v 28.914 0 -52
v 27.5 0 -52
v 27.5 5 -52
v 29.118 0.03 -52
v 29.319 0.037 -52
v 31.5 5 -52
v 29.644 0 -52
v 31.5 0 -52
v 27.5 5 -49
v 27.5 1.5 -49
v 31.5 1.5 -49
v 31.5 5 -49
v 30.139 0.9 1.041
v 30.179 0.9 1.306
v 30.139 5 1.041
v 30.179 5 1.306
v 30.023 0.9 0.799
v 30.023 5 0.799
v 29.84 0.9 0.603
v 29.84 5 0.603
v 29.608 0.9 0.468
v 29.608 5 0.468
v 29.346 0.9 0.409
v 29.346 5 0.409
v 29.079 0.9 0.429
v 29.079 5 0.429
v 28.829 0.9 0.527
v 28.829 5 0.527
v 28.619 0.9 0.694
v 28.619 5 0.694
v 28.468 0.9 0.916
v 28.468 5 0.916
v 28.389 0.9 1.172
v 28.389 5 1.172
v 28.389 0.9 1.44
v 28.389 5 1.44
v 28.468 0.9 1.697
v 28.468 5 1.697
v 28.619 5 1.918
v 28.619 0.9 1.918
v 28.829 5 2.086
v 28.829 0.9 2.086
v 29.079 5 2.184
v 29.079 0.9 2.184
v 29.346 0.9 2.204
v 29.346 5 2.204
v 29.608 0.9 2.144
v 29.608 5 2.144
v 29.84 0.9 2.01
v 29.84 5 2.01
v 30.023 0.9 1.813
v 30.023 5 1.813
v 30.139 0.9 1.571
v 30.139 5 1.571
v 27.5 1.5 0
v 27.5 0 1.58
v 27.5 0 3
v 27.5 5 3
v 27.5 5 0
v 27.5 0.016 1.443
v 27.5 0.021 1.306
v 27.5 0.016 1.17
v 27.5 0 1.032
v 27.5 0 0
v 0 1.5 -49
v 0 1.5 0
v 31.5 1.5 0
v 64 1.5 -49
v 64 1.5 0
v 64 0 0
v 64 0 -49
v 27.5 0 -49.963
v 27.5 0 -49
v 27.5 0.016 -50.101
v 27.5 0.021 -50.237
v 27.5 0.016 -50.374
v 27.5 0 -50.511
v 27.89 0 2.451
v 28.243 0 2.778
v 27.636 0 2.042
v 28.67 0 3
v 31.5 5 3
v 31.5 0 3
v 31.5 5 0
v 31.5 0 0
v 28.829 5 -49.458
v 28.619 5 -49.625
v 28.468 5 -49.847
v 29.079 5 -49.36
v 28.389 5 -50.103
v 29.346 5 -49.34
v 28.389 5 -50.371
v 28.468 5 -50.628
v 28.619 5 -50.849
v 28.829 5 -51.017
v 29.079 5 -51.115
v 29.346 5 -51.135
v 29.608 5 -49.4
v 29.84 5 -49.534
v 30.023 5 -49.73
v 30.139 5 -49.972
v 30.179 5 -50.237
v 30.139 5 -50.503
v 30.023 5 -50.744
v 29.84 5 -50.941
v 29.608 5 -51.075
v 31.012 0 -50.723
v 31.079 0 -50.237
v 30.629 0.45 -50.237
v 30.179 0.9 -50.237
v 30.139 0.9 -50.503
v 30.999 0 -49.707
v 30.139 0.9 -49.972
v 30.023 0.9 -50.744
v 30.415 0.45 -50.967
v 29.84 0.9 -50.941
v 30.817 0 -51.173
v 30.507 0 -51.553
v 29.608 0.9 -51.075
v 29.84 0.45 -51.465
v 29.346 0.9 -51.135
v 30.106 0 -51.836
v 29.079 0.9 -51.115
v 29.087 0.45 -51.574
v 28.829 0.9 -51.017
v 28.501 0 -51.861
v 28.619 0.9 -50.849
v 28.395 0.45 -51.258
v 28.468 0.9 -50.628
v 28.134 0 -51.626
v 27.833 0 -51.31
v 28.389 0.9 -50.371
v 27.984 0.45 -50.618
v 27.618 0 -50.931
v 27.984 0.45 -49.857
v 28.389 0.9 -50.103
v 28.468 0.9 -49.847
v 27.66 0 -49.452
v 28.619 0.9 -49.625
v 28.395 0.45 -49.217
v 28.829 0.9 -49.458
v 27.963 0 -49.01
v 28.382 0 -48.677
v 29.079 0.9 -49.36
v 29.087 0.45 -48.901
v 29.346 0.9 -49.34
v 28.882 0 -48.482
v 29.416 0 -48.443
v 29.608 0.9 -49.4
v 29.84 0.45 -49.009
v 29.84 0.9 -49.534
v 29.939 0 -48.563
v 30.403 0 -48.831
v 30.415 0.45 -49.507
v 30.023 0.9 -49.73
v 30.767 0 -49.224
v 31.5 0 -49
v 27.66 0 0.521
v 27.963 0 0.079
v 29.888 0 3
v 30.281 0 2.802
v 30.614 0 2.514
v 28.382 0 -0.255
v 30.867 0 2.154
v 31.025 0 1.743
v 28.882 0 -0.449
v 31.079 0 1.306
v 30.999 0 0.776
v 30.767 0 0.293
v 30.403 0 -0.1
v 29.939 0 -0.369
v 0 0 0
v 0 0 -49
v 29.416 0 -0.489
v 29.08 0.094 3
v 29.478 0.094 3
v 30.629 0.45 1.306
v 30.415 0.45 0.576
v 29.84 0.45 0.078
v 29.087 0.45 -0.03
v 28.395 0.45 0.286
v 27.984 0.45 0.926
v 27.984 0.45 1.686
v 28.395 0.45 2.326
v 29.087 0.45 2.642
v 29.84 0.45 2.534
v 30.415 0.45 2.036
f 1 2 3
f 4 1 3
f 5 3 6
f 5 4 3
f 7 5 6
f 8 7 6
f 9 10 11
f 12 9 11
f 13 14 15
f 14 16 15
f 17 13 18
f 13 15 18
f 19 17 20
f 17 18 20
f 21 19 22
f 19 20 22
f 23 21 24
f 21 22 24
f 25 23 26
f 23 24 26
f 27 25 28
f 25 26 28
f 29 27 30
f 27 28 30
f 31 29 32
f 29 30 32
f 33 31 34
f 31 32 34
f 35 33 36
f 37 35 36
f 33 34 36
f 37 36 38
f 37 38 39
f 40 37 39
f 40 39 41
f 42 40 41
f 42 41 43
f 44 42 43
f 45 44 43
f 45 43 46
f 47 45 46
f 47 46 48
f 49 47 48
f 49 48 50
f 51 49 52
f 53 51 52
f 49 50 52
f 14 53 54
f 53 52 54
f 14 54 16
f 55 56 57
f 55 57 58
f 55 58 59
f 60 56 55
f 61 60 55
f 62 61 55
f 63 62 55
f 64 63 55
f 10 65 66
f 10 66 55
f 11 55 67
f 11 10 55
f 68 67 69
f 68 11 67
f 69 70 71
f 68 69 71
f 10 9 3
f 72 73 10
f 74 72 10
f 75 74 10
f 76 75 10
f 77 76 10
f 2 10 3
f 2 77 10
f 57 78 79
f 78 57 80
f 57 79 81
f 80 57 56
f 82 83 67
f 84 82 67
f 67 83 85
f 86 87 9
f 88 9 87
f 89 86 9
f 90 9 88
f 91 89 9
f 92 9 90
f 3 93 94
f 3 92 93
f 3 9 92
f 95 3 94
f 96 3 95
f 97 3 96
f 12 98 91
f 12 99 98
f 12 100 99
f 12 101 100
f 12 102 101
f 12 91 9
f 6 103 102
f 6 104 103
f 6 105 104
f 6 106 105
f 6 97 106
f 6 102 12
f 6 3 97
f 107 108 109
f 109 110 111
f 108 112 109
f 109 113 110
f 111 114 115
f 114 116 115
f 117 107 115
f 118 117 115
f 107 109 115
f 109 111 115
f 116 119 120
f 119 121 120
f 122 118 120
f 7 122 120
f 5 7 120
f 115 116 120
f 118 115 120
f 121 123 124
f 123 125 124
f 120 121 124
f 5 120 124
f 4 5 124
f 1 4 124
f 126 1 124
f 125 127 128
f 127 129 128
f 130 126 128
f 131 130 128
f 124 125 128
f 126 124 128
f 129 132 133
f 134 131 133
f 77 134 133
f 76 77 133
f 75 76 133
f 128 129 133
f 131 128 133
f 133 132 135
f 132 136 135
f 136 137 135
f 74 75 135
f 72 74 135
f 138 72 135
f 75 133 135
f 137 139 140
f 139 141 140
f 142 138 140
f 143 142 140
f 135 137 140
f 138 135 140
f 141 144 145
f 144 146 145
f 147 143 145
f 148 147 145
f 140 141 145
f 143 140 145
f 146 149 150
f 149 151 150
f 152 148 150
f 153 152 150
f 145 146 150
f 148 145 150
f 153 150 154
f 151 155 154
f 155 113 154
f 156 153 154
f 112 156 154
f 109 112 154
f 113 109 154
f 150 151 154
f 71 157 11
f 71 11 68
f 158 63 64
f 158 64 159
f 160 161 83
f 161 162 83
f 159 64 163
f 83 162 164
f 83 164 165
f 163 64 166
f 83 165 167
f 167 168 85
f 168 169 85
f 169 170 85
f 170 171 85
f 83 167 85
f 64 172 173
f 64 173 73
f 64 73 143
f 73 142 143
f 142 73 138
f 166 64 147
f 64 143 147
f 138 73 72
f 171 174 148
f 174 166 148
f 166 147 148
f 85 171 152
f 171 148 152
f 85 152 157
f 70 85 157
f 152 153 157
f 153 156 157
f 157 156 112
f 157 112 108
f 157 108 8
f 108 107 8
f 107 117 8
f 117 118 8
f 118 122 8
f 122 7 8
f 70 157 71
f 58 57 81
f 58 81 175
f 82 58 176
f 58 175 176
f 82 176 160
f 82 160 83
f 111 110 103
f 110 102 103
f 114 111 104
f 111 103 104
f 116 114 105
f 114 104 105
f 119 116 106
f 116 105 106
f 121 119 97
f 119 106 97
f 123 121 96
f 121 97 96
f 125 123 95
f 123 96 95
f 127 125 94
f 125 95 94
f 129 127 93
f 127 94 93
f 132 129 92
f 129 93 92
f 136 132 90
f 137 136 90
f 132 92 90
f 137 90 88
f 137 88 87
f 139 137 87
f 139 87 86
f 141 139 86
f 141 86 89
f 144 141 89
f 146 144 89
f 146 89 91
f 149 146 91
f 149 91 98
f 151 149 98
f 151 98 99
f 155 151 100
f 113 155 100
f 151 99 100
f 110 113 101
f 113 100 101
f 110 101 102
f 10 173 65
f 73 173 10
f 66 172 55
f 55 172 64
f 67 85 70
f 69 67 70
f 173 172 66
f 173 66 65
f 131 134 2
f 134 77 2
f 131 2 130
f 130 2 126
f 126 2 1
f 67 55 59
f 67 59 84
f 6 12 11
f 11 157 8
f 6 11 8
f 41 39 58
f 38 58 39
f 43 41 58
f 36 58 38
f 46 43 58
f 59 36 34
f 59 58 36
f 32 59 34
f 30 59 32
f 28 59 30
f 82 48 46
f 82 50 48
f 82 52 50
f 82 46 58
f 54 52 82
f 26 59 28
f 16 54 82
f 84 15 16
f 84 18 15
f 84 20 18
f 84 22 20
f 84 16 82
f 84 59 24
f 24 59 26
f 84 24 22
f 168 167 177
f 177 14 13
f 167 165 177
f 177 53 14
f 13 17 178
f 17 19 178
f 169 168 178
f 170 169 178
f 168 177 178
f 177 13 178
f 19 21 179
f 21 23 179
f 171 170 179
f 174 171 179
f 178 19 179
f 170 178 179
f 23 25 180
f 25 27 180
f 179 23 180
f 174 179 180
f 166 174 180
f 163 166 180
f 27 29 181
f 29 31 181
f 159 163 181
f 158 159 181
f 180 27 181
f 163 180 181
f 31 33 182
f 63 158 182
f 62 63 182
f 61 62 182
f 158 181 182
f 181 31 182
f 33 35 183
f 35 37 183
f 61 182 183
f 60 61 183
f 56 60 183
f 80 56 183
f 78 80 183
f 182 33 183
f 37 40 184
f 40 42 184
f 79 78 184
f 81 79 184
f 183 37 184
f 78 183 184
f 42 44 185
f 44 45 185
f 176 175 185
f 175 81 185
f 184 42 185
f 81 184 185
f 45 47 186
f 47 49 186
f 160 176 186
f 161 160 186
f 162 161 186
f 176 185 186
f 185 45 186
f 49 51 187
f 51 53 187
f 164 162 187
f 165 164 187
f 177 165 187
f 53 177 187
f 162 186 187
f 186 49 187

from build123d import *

# Parameters (mm, degrees)
SKETCH1_W                                            = 64
SKETCH1_H                                            = 49
BOSS_EXTRUDE1_DEPTH                                  = 1.5
SKETCH4_W                                            = 4
SKETCH4_H                                            = 3
BOSS_EXTRUDE2_DEPTH                                  = 5
CSK_FOR_M1_6_COUNTERSUNK_FLAT_HEAD_SCREW_D           = 1.8
CSK_FOR_M1_6_COUNTERSUNK_FLAT_HEAD_SCREW_CSINK_D     = 3.6
CSK_FOR_M1_6_COUNTERSUNK_FLAT_HEAD_SCREW_CSINK_ANGLE = 90


with BuildPart() as part:
    # Sketch1 → Boss-Extrude1 (new body)
    with BuildSketch(Plane(origin=(0, 0, 0), x_dir=(1, 0, 0), z_dir=(0, 1, 0))):
        with Locations((32, 24.5)):
            Rectangle(SKETCH1_W, SKETCH1_H)
    extrude(amount=BOSS_EXTRUDE1_DEPTH)

    # Sketch4 → Boss-Extrude2 (add)
    with BuildSketch(Plane(origin=(0, 0, 0), x_dir=(1, 0, 0), z_dir=(0, 1, 0))):
        with Locations((29.5, -1.5)):
            Rectangle(SKETCH4_W, SKETCH4_H)
        with Locations((29.5, 50.5)):
            Rectangle(SKETCH4_W, SKETCH4_H)
    extrude(amount=BOSS_EXTRUDE2_DEPTH)

    # CSK for M1.6 Countersunk Flat Head Screw1 (through all)
    with Locations(Plane(origin=(0, 0, 0), x_dir=(-1, 0, 0), z_dir=(0, -1, 0))):
        with Locations((-29.279045155, 50.23733833), (-29.279045155, -1.306151962)):
            CounterSinkHole(CSK_FOR_M1_6_COUNTERSUNK_FLAT_HEAD_SCREW_D / 2, CSK_FOR_M1_6_COUNTERSUNK_FLAT_HEAD_SCREW_CSINK_D / 2, counter_sink_angle=CSK_FOR_M1_6_COUNTERSUNK_FLAT_HEAD_SCREW_CSINK_ANGLE)


solid = part.part
